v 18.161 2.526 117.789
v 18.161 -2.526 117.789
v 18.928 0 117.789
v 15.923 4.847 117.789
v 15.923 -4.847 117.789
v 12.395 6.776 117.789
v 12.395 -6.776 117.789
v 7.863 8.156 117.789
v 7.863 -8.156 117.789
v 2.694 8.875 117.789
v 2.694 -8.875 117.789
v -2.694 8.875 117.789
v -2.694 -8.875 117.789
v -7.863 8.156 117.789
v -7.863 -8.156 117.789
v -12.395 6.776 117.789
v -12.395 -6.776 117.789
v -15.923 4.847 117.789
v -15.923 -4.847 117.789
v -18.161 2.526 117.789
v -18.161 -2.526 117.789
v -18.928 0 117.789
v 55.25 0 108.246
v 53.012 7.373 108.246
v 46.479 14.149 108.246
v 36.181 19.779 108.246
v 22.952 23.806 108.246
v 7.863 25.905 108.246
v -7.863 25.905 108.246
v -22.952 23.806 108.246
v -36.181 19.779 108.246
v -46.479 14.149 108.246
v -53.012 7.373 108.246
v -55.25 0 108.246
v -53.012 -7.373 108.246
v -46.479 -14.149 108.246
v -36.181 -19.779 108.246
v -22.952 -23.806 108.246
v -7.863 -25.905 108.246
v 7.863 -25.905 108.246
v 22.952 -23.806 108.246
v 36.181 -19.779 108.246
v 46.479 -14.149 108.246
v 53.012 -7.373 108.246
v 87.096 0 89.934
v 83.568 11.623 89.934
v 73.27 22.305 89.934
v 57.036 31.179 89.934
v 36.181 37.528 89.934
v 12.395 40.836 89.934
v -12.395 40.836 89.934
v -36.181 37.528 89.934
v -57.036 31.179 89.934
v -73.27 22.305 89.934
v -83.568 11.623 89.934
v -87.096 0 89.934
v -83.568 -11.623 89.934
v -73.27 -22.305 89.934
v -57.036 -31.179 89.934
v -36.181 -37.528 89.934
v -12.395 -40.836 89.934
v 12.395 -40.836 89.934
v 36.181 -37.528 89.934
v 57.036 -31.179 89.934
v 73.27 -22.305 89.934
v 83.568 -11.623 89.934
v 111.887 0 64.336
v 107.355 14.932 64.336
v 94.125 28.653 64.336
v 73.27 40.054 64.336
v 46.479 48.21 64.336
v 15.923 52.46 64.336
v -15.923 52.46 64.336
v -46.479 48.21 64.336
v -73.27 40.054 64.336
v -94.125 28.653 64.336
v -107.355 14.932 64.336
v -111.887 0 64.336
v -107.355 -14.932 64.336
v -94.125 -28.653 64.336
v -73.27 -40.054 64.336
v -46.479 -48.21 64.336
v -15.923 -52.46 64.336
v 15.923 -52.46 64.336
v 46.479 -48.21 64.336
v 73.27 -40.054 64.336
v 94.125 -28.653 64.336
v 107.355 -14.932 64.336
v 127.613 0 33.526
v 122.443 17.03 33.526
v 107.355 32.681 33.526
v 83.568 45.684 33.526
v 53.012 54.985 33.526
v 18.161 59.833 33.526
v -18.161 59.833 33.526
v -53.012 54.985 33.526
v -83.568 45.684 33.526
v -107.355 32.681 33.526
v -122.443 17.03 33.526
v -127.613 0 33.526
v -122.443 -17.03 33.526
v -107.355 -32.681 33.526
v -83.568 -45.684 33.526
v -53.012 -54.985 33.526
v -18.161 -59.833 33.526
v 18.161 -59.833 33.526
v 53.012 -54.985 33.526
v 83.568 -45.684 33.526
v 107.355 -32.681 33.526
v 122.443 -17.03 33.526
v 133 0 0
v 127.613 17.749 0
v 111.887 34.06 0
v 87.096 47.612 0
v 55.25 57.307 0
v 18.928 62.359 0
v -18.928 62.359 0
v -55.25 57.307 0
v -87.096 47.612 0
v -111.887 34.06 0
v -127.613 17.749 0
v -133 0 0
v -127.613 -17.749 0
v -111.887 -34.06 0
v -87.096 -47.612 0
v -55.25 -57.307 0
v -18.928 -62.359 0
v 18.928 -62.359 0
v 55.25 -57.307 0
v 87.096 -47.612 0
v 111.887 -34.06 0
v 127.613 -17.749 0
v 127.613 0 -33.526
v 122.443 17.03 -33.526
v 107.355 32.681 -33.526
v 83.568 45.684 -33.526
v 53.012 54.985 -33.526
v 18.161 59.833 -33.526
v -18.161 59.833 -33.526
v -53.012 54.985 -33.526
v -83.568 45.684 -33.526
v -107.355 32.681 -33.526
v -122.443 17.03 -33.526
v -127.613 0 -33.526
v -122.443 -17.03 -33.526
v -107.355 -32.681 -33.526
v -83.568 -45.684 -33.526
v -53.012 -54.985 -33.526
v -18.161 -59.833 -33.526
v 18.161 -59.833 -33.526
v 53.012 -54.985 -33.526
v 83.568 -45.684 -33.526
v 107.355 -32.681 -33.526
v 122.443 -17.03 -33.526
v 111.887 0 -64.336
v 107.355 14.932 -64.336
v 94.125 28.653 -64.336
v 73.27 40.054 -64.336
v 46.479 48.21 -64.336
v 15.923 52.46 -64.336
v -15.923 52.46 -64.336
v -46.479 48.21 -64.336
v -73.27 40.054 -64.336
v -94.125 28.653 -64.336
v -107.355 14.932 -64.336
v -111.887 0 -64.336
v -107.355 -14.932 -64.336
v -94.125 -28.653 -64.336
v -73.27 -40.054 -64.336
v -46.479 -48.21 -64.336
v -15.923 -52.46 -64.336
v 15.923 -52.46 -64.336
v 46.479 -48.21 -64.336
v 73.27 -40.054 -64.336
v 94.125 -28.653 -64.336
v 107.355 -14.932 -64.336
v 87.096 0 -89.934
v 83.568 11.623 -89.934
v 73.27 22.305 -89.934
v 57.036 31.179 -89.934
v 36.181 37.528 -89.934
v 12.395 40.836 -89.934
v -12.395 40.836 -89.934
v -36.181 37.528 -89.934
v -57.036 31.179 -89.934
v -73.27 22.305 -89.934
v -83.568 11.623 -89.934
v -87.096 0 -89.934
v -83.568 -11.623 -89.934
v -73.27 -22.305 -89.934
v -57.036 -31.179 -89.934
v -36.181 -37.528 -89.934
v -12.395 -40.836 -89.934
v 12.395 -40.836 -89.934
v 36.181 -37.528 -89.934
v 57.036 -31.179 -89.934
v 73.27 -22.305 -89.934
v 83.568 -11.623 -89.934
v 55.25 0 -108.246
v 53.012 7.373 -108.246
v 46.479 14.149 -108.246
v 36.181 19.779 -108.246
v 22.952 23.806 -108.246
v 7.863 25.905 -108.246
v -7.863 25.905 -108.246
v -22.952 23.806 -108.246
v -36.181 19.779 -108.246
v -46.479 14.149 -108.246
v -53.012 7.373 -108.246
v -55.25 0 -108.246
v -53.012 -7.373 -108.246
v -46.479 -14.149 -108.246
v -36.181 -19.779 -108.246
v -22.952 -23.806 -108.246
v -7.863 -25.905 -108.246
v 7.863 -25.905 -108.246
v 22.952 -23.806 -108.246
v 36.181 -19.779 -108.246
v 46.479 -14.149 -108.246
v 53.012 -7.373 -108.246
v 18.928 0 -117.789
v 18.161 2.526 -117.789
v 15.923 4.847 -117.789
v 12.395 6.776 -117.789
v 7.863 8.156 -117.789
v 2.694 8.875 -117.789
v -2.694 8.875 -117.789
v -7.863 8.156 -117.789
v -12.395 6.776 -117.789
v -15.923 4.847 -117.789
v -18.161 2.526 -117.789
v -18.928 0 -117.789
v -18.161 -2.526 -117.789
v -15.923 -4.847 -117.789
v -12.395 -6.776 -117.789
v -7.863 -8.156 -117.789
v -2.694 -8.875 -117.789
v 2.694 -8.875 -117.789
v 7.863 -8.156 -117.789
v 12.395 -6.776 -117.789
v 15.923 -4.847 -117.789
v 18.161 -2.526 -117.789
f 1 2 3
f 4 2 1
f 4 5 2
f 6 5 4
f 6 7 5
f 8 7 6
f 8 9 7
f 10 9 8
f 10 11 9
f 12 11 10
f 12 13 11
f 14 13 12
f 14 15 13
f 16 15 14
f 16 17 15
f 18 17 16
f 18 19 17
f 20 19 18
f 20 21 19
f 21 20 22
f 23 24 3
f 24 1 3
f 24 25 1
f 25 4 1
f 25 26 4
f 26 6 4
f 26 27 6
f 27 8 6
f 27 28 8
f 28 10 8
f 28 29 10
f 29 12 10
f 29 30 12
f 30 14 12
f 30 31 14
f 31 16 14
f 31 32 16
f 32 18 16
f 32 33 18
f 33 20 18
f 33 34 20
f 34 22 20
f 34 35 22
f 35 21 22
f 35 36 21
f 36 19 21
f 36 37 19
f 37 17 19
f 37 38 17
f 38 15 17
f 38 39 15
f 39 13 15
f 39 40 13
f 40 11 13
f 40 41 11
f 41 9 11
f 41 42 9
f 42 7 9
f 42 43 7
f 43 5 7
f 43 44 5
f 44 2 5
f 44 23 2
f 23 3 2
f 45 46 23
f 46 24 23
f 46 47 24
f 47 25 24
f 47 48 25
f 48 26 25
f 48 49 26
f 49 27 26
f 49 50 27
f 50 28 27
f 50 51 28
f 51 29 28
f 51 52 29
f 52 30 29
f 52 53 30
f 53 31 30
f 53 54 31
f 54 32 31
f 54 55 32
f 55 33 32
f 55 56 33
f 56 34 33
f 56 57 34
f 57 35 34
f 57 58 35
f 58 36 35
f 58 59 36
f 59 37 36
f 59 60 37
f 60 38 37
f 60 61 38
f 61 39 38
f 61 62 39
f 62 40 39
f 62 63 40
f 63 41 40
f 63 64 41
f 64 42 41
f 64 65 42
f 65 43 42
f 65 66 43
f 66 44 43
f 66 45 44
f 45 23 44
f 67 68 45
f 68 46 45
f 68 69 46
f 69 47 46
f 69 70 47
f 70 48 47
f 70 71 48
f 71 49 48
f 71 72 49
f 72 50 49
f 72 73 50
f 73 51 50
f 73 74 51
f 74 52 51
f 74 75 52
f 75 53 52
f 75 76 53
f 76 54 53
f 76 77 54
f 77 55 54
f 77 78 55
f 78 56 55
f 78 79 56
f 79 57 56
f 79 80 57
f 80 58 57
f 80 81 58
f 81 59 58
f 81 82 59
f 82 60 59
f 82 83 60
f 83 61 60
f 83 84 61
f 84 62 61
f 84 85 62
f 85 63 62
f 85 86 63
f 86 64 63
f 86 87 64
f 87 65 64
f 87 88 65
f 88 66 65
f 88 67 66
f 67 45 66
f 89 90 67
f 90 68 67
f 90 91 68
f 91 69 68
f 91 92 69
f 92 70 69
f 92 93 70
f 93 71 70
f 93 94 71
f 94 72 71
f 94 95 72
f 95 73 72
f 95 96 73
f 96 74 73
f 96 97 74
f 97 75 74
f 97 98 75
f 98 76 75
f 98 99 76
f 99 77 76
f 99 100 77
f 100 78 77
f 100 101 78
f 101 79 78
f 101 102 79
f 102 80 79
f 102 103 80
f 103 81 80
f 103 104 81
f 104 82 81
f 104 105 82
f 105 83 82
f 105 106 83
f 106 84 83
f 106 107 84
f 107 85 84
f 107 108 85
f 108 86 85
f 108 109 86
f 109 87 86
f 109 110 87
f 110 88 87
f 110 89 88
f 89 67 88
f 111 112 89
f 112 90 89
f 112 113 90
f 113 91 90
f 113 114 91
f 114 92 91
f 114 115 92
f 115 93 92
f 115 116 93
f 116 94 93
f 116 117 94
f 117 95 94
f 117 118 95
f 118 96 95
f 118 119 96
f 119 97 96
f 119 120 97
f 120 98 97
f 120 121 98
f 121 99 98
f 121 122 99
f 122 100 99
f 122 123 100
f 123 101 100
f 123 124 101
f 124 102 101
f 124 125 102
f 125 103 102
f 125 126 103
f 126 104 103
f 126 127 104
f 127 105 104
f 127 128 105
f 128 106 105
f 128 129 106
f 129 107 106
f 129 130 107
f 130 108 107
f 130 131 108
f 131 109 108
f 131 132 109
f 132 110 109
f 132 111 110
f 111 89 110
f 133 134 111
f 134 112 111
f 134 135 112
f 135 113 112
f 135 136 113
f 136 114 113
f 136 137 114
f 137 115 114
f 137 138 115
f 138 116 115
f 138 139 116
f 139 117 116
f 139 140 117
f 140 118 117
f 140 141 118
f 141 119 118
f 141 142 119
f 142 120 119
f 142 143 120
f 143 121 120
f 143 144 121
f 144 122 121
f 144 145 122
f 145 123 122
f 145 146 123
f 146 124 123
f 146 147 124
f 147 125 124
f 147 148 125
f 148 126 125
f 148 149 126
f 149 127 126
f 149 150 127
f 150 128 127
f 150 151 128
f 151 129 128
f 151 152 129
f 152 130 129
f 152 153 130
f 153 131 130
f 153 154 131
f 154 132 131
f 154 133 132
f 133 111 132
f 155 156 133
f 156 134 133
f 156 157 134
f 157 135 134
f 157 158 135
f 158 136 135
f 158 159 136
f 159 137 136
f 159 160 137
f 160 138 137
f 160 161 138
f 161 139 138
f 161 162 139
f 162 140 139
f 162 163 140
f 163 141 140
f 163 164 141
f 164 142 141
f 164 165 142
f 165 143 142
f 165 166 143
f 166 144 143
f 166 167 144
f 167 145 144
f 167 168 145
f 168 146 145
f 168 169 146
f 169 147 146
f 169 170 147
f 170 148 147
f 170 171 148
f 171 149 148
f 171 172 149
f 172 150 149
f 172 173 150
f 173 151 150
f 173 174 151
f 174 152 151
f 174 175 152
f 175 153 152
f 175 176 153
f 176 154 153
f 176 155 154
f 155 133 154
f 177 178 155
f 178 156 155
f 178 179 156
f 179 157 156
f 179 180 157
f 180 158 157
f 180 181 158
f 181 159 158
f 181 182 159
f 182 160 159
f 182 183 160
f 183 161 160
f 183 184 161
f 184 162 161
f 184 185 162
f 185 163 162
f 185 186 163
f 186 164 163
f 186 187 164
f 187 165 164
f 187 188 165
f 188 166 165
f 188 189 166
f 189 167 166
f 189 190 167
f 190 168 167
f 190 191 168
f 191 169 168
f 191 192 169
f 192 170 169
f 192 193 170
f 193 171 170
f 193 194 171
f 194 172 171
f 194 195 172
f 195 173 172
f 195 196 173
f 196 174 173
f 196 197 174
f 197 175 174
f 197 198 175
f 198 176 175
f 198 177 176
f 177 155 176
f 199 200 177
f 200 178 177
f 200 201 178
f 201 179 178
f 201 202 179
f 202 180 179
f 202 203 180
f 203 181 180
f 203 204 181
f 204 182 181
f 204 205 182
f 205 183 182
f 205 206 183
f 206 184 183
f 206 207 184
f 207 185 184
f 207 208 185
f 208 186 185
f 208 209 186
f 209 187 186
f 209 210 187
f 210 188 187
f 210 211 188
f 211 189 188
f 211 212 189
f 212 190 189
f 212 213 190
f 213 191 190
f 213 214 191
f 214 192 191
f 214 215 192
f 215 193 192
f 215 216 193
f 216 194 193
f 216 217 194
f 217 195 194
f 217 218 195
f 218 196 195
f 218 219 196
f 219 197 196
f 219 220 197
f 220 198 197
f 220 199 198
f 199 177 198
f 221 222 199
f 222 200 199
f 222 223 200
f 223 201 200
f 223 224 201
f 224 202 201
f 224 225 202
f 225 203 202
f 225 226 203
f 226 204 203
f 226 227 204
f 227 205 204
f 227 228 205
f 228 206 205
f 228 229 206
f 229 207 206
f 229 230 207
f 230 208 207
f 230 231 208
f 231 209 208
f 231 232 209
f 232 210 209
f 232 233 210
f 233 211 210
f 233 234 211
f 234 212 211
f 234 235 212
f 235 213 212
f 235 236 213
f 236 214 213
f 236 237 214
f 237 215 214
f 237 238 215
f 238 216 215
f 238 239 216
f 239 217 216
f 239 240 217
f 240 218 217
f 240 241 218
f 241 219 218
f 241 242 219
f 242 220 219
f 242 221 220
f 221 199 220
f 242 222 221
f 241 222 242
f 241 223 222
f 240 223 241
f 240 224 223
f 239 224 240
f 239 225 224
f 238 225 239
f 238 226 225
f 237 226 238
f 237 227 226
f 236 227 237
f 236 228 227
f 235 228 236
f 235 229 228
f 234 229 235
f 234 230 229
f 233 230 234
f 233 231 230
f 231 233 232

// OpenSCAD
// Generated by SolidPython 1.0.1 on 2020-07-29 00:46:54


scale(v = [19, 9, 17]) {
	sphere(r = 7);
}
/***********************************************
*********      SolidPython code:      **********
************************************************
 
# import packages: SolidPython
from solid import *
from solid.utils import *
from itertools import chain, combinations, permutations


class Resize:

    def __init__(self, scad_file):
        self.scad_file = scad_file
        #self.scad_file = import_scad(scad_file)
        # cone/cylinder param:
        self.r1 = 0
        self.r2 = 0
        self.h = 0
        # rectangular prism param:
        self.w = 0
        self.l = 0
        # ellipse param:
        self.r = 0

    # import OpenScad code (file name corresponds to shape)


    # classify shape + parameters
    def assign(self, param1, param2, param3):
        if self.scad_file == 'cone.scad':
            self.r1 = param1
            self.r2 = param2
            self.h = param3
        elif self.scad_file == 'cylinder.scad':
            self.r1 = param1
            self.r2 = param2
            self.h = param3
        elif self.scad_file == 'rectangularPrism.scad':
            self.h = param1
            self.l = param2
            self.w = param3
        else:
            self.r = param1
            self.h = param2

    # resize parameters
    def iterate(self):
        x = range(3, 20, 2)
        i = 1
        if self.scad_file == 'cone.scad':
            tempList = list(permutations(x, 2))
            for temp in tempList:
                param1 = temp[0]
                param2 = temp[1]
                filepath = 'produced_scad_files/' + 'cone' + str(param1) + '_' + str(param2) + '_' + '.scad'
                scad_render_to_file(cylinder(h=param1, r1=param2, r2=0), filepath)

        elif self.scad_file == 'cylinder.scad':
            tempList = list(permutations(x, 3))
            for temp in tempList:
                param1 = temp[0]
                param2 = temp[1]
                filepath = 'produced_scad_files/' + 'cylinder' + str(param1) + '_' + str(param2) + '_' + '.scad'
                scad_render_to_file(cylinder(h=param1, r1=param2, r2=param2), filepath)

        elif self.scad_file == 'rectangularPrism.scad':
            tempList = list(permutations(x, 3))
            for temp in tempList:
                param1 = temp[0]
                param2 = temp[1]
                param3 = temp[2]
                filepath = 'produced_scad_files/' + 'rectangularPrism' + str(param1) + '_' + str(param2) + '_' + str(
                    param3) + '.scad'
                scad_render_to_file(cube(size=(param1, param2, param3)), filepath)

        elif self.scad_file == 'ellipse.scad':
            tempList = list(permutations(x, 4))
            for temp in tempList:
                param1 = temp[0]
                param2 = temp[1]
                param3 = temp[2]
                param4 = temp[3]
                filepath = 'produced_scad_files/' + 'ellipse' + str(param1) + '_' + str(param2) + '_' + str(param3) + '_' + str(param4) + '.scad'
                scad_render_to_file(scale([param1, param2, param3])(sphere(r=param4)), filepath)

    def render_to_scadfile(self):
        scad_render_to_file(scad, 'example.scad') 
 
************************************************/
